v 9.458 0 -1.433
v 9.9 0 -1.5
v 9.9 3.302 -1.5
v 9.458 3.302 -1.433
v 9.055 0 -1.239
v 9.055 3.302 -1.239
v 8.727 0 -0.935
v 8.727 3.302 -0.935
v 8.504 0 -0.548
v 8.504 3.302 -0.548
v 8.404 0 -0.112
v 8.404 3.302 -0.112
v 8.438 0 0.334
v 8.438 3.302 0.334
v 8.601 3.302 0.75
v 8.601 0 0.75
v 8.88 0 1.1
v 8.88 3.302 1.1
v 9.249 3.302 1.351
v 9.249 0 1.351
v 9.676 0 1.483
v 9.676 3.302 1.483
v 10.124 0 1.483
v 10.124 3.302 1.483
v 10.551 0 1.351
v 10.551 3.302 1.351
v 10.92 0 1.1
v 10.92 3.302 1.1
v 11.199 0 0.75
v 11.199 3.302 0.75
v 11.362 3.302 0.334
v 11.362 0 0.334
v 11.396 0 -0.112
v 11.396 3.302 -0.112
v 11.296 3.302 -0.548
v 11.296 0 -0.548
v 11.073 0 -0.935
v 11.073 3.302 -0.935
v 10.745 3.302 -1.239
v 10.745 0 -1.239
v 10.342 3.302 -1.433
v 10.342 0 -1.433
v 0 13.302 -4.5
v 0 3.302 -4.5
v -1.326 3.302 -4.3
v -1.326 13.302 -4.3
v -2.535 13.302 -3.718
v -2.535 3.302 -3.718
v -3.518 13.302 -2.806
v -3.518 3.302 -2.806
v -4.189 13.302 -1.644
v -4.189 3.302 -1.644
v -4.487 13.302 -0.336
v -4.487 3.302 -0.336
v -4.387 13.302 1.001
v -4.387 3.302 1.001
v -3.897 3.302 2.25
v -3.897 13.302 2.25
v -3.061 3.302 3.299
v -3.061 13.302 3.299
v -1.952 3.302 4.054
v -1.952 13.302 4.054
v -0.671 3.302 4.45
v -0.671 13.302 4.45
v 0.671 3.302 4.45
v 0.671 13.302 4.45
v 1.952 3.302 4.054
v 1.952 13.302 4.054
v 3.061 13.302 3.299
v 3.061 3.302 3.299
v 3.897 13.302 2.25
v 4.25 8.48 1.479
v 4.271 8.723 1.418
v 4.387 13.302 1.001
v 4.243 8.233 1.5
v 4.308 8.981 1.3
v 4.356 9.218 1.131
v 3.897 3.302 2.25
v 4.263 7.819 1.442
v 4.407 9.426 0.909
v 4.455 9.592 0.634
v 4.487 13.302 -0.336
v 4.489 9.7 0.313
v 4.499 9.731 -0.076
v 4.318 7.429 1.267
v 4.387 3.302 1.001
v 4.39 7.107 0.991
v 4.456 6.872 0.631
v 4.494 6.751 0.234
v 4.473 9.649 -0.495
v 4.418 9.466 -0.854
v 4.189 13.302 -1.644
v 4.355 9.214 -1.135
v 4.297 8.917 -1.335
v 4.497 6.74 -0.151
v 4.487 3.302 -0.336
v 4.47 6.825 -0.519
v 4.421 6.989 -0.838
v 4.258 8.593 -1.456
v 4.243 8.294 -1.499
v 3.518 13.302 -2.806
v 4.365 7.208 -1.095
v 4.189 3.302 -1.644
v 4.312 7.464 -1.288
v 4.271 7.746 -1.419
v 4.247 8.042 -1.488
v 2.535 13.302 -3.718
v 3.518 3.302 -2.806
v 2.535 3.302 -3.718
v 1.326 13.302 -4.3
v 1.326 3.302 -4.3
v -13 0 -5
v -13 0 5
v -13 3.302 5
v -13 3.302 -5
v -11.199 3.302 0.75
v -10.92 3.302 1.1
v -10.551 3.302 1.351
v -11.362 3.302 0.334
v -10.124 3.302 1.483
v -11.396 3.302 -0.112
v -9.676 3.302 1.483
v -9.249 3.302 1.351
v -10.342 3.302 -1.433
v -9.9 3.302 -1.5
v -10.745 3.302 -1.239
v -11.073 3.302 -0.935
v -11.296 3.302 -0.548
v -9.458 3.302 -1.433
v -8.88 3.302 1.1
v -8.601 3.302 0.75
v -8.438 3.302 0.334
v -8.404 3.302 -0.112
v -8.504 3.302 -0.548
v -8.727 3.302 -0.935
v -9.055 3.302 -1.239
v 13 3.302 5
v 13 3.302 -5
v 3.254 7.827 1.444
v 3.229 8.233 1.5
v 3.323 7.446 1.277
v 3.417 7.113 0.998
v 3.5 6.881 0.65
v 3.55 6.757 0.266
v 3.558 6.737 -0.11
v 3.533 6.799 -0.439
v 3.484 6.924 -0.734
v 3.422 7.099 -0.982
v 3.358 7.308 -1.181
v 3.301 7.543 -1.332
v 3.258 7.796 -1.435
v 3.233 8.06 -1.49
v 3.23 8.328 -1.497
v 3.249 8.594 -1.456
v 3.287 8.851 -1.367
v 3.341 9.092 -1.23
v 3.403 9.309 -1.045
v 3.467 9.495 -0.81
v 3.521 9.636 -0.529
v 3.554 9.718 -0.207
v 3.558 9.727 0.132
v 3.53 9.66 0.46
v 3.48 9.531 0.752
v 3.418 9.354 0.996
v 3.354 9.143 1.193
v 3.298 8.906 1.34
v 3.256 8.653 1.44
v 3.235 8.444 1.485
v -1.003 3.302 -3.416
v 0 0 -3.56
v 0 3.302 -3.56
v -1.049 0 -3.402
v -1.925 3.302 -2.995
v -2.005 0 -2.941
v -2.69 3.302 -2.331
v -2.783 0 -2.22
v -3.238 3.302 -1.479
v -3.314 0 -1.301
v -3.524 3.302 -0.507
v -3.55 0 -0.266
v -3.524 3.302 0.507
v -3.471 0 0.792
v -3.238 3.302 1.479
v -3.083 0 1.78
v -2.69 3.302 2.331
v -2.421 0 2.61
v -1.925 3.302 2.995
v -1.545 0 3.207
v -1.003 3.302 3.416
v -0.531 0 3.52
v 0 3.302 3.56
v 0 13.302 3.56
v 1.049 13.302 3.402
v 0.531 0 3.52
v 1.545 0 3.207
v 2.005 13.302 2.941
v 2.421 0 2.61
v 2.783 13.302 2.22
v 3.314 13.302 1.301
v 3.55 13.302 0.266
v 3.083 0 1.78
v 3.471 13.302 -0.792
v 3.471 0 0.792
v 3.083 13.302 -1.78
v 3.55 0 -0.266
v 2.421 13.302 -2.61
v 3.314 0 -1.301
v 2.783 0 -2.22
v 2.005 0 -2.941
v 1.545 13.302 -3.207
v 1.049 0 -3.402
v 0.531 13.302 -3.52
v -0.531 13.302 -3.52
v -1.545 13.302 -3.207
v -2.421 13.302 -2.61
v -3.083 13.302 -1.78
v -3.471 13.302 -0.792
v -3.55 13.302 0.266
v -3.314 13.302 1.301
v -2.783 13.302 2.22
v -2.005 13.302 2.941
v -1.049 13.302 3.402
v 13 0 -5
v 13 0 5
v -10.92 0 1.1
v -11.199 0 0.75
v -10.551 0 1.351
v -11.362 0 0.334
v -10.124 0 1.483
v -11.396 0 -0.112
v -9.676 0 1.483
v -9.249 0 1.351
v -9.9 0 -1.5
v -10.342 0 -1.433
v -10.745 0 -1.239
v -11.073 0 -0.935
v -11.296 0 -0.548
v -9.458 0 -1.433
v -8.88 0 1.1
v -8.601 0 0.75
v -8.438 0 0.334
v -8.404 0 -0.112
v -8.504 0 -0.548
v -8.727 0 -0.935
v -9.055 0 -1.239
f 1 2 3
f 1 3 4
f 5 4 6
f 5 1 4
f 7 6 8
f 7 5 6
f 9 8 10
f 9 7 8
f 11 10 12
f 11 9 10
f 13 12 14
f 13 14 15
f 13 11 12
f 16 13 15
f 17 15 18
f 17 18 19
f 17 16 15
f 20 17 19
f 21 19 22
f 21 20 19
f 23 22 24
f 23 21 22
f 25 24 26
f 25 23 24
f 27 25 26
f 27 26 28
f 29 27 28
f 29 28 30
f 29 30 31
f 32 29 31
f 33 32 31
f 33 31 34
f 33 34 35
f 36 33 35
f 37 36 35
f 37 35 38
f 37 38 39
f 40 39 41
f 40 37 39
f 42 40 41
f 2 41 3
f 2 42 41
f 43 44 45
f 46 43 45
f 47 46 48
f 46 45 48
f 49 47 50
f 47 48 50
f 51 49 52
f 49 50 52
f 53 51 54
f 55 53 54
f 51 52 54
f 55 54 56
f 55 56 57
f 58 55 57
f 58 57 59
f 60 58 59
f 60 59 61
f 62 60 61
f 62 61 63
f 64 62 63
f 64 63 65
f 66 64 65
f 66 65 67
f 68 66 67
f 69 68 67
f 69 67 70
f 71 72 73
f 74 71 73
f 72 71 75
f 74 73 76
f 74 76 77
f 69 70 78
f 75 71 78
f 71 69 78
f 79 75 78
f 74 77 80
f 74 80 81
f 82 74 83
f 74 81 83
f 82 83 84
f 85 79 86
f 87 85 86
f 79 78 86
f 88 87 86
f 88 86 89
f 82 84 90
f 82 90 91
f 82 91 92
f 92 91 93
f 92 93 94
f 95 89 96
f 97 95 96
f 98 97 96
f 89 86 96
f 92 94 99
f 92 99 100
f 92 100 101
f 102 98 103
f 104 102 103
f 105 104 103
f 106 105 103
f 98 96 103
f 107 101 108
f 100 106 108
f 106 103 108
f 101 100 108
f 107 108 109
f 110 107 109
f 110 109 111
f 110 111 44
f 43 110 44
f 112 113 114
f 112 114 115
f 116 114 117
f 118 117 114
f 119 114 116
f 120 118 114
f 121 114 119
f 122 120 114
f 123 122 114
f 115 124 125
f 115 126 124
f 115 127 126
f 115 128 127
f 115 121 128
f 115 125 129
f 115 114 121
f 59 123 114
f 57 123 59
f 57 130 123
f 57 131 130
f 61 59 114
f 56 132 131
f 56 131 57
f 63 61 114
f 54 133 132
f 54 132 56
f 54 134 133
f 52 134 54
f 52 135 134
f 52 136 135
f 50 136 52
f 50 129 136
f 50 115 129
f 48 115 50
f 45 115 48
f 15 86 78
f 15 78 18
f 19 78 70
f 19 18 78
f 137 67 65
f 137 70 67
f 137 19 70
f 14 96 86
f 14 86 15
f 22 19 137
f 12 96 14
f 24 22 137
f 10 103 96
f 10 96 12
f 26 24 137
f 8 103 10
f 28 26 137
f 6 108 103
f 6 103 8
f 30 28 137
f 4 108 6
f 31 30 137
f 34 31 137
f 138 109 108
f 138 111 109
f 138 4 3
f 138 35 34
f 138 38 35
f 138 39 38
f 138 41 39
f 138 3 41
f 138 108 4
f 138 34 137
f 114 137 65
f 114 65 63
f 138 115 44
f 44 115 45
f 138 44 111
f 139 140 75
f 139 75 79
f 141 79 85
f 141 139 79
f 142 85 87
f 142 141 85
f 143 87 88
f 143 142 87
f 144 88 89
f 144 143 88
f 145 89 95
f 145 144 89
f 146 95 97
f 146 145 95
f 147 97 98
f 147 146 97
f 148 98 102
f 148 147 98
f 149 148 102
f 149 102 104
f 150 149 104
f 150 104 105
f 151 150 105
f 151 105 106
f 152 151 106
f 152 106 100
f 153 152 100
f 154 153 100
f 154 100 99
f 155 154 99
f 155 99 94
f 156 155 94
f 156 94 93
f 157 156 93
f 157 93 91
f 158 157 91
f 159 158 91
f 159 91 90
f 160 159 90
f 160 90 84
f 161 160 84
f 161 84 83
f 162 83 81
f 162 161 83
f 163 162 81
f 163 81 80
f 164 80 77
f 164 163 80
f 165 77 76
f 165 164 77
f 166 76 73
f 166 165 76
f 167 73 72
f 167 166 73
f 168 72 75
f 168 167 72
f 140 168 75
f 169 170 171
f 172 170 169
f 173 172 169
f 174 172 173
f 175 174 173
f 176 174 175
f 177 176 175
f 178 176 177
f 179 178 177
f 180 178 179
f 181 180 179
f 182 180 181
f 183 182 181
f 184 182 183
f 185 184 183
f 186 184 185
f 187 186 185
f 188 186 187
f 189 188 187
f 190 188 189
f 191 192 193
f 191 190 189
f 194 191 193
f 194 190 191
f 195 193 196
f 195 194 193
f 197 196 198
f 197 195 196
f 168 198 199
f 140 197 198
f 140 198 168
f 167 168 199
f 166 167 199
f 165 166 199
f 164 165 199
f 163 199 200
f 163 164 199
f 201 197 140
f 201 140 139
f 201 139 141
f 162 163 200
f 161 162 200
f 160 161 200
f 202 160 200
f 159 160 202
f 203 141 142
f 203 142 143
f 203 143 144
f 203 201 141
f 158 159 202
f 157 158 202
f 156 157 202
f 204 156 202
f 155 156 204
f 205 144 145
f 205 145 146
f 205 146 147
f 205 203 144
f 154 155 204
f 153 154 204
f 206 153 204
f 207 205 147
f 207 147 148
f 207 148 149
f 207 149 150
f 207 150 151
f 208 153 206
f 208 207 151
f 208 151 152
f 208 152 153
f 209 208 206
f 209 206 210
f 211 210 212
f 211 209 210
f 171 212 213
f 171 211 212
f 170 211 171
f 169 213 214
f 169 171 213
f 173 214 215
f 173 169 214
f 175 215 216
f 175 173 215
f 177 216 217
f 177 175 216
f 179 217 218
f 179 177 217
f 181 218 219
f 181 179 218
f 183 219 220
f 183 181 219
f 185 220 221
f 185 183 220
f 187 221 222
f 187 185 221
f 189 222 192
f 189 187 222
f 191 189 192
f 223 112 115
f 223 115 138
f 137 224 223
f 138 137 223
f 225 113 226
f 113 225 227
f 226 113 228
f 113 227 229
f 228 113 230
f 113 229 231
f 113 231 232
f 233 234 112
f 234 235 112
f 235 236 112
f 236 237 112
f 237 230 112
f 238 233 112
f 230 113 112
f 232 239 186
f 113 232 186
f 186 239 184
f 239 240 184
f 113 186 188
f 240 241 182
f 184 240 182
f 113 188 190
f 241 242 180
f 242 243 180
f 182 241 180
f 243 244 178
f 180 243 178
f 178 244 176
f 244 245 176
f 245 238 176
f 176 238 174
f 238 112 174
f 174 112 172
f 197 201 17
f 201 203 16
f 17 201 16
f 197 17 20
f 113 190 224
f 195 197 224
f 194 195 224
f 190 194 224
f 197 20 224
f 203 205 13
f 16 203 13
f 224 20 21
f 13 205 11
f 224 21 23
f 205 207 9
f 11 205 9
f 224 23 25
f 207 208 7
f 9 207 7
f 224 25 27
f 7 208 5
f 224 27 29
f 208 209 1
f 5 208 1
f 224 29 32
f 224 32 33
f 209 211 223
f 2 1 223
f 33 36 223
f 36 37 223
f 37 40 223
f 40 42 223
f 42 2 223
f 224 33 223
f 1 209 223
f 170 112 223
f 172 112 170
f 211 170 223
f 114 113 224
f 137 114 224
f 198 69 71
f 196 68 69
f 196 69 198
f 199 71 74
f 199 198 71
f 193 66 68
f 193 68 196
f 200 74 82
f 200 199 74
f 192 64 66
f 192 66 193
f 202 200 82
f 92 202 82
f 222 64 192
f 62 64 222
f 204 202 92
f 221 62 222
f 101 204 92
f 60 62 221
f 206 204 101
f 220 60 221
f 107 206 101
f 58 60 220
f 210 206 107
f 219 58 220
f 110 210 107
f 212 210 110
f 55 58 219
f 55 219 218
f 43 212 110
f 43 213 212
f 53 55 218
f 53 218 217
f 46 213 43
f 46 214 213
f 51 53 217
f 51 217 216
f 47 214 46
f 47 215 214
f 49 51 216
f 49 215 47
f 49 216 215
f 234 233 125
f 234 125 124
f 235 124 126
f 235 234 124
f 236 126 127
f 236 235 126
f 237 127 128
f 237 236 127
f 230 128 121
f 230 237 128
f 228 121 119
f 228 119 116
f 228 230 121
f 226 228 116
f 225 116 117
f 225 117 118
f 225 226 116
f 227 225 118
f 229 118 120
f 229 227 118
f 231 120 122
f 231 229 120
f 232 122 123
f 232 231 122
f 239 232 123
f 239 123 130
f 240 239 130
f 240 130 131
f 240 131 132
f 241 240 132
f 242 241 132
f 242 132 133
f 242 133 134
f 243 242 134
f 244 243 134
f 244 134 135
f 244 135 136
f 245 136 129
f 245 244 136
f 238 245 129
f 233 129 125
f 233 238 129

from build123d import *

# Parameters (mm, degrees)
SKETCH1_W             = 26
SKETCH1_H             = 10
SKETCH1_R             = 1.5
BOSS_EXTRUDE5_DEPTH   = 3.302
SKETCH5_R             = 4.5
SKETCH5_R_2           = 3.56
BOSS_EXTRUDE7_DEPTH   = 10
SKETCH7_R             = 1.5
CUT_EXTRUDE1_DEPTH    = 10
CORTAR_EXTRUIR1_START = -10
CROQUIS1_R            = 3.56
CORTAR_EXTRUIR1_DEPTH = 10


with BuildPart() as part:
    # Sketch1 → Boss-Extrude5 (new body)
    with BuildSketch(Plane(origin=(0, 0, 0), x_dir=(1, 0, 0), z_dir=(0, 1, 0))):
        Rectangle(SKETCH1_W, SKETCH1_H)
        with Locations(Location((-9.9, 0, 0), (0, 0, 90))):
            Circle(SKETCH1_R, mode=Mode.SUBTRACT)
        with Locations(Location((9.9, 0, 0), (0, 0, 90))):
            Circle(SKETCH1_R, mode=Mode.SUBTRACT)
    extrude(amount=BOSS_EXTRUDE5_DEPTH)

    # Sketch5 → Boss-Extrude7 (add)
    with BuildSketch(Plane(origin=(0, 3.302, 0), x_dir=(1, 0, 0), z_dir=(0, 1, 0))):
        with Locations(Location((0, 0, 0), (0, 0, 90))):
            Circle(SKETCH5_R)
        with Locations(Location((0, 0, 0), (0, 0, 270))):
            Circle(SKETCH5_R_2, mode=Mode.SUBTRACT)
    extrude(amount=BOSS_EXTRUDE7_DEPTH)

    # Sketch7 → Cut-Extrude1 (cut)
    with BuildSketch(Plane(origin=(0, 0, 0), x_dir=(0, 0, -1), z_dir=(1, 0, 0))):
        with Locations(Location((0, 8.232726323, 0), (0, 0, 180))):
            Circle(SKETCH7_R)
    extrude(amount=CUT_EXTRUDE1_DEPTH, mode=Mode.SUBTRACT)

    # Croquis1 → Cortar-Extruir1 (cut)
    with BuildSketch(Plane(origin=(0, 3.302, 0), x_dir=(1, 0, 0), z_dir=(0, 1, 0)).offset(CORTAR_EXTRUIR1_START)):
        with Locations(Location((0, 0, 0), (0, 0, 90))):
            Circle(CROQUIS1_R)
    extrude(amount=CORTAR_EXTRUIR1_DEPTH, mode=Mode.SUBTRACT)


solid = part.part
